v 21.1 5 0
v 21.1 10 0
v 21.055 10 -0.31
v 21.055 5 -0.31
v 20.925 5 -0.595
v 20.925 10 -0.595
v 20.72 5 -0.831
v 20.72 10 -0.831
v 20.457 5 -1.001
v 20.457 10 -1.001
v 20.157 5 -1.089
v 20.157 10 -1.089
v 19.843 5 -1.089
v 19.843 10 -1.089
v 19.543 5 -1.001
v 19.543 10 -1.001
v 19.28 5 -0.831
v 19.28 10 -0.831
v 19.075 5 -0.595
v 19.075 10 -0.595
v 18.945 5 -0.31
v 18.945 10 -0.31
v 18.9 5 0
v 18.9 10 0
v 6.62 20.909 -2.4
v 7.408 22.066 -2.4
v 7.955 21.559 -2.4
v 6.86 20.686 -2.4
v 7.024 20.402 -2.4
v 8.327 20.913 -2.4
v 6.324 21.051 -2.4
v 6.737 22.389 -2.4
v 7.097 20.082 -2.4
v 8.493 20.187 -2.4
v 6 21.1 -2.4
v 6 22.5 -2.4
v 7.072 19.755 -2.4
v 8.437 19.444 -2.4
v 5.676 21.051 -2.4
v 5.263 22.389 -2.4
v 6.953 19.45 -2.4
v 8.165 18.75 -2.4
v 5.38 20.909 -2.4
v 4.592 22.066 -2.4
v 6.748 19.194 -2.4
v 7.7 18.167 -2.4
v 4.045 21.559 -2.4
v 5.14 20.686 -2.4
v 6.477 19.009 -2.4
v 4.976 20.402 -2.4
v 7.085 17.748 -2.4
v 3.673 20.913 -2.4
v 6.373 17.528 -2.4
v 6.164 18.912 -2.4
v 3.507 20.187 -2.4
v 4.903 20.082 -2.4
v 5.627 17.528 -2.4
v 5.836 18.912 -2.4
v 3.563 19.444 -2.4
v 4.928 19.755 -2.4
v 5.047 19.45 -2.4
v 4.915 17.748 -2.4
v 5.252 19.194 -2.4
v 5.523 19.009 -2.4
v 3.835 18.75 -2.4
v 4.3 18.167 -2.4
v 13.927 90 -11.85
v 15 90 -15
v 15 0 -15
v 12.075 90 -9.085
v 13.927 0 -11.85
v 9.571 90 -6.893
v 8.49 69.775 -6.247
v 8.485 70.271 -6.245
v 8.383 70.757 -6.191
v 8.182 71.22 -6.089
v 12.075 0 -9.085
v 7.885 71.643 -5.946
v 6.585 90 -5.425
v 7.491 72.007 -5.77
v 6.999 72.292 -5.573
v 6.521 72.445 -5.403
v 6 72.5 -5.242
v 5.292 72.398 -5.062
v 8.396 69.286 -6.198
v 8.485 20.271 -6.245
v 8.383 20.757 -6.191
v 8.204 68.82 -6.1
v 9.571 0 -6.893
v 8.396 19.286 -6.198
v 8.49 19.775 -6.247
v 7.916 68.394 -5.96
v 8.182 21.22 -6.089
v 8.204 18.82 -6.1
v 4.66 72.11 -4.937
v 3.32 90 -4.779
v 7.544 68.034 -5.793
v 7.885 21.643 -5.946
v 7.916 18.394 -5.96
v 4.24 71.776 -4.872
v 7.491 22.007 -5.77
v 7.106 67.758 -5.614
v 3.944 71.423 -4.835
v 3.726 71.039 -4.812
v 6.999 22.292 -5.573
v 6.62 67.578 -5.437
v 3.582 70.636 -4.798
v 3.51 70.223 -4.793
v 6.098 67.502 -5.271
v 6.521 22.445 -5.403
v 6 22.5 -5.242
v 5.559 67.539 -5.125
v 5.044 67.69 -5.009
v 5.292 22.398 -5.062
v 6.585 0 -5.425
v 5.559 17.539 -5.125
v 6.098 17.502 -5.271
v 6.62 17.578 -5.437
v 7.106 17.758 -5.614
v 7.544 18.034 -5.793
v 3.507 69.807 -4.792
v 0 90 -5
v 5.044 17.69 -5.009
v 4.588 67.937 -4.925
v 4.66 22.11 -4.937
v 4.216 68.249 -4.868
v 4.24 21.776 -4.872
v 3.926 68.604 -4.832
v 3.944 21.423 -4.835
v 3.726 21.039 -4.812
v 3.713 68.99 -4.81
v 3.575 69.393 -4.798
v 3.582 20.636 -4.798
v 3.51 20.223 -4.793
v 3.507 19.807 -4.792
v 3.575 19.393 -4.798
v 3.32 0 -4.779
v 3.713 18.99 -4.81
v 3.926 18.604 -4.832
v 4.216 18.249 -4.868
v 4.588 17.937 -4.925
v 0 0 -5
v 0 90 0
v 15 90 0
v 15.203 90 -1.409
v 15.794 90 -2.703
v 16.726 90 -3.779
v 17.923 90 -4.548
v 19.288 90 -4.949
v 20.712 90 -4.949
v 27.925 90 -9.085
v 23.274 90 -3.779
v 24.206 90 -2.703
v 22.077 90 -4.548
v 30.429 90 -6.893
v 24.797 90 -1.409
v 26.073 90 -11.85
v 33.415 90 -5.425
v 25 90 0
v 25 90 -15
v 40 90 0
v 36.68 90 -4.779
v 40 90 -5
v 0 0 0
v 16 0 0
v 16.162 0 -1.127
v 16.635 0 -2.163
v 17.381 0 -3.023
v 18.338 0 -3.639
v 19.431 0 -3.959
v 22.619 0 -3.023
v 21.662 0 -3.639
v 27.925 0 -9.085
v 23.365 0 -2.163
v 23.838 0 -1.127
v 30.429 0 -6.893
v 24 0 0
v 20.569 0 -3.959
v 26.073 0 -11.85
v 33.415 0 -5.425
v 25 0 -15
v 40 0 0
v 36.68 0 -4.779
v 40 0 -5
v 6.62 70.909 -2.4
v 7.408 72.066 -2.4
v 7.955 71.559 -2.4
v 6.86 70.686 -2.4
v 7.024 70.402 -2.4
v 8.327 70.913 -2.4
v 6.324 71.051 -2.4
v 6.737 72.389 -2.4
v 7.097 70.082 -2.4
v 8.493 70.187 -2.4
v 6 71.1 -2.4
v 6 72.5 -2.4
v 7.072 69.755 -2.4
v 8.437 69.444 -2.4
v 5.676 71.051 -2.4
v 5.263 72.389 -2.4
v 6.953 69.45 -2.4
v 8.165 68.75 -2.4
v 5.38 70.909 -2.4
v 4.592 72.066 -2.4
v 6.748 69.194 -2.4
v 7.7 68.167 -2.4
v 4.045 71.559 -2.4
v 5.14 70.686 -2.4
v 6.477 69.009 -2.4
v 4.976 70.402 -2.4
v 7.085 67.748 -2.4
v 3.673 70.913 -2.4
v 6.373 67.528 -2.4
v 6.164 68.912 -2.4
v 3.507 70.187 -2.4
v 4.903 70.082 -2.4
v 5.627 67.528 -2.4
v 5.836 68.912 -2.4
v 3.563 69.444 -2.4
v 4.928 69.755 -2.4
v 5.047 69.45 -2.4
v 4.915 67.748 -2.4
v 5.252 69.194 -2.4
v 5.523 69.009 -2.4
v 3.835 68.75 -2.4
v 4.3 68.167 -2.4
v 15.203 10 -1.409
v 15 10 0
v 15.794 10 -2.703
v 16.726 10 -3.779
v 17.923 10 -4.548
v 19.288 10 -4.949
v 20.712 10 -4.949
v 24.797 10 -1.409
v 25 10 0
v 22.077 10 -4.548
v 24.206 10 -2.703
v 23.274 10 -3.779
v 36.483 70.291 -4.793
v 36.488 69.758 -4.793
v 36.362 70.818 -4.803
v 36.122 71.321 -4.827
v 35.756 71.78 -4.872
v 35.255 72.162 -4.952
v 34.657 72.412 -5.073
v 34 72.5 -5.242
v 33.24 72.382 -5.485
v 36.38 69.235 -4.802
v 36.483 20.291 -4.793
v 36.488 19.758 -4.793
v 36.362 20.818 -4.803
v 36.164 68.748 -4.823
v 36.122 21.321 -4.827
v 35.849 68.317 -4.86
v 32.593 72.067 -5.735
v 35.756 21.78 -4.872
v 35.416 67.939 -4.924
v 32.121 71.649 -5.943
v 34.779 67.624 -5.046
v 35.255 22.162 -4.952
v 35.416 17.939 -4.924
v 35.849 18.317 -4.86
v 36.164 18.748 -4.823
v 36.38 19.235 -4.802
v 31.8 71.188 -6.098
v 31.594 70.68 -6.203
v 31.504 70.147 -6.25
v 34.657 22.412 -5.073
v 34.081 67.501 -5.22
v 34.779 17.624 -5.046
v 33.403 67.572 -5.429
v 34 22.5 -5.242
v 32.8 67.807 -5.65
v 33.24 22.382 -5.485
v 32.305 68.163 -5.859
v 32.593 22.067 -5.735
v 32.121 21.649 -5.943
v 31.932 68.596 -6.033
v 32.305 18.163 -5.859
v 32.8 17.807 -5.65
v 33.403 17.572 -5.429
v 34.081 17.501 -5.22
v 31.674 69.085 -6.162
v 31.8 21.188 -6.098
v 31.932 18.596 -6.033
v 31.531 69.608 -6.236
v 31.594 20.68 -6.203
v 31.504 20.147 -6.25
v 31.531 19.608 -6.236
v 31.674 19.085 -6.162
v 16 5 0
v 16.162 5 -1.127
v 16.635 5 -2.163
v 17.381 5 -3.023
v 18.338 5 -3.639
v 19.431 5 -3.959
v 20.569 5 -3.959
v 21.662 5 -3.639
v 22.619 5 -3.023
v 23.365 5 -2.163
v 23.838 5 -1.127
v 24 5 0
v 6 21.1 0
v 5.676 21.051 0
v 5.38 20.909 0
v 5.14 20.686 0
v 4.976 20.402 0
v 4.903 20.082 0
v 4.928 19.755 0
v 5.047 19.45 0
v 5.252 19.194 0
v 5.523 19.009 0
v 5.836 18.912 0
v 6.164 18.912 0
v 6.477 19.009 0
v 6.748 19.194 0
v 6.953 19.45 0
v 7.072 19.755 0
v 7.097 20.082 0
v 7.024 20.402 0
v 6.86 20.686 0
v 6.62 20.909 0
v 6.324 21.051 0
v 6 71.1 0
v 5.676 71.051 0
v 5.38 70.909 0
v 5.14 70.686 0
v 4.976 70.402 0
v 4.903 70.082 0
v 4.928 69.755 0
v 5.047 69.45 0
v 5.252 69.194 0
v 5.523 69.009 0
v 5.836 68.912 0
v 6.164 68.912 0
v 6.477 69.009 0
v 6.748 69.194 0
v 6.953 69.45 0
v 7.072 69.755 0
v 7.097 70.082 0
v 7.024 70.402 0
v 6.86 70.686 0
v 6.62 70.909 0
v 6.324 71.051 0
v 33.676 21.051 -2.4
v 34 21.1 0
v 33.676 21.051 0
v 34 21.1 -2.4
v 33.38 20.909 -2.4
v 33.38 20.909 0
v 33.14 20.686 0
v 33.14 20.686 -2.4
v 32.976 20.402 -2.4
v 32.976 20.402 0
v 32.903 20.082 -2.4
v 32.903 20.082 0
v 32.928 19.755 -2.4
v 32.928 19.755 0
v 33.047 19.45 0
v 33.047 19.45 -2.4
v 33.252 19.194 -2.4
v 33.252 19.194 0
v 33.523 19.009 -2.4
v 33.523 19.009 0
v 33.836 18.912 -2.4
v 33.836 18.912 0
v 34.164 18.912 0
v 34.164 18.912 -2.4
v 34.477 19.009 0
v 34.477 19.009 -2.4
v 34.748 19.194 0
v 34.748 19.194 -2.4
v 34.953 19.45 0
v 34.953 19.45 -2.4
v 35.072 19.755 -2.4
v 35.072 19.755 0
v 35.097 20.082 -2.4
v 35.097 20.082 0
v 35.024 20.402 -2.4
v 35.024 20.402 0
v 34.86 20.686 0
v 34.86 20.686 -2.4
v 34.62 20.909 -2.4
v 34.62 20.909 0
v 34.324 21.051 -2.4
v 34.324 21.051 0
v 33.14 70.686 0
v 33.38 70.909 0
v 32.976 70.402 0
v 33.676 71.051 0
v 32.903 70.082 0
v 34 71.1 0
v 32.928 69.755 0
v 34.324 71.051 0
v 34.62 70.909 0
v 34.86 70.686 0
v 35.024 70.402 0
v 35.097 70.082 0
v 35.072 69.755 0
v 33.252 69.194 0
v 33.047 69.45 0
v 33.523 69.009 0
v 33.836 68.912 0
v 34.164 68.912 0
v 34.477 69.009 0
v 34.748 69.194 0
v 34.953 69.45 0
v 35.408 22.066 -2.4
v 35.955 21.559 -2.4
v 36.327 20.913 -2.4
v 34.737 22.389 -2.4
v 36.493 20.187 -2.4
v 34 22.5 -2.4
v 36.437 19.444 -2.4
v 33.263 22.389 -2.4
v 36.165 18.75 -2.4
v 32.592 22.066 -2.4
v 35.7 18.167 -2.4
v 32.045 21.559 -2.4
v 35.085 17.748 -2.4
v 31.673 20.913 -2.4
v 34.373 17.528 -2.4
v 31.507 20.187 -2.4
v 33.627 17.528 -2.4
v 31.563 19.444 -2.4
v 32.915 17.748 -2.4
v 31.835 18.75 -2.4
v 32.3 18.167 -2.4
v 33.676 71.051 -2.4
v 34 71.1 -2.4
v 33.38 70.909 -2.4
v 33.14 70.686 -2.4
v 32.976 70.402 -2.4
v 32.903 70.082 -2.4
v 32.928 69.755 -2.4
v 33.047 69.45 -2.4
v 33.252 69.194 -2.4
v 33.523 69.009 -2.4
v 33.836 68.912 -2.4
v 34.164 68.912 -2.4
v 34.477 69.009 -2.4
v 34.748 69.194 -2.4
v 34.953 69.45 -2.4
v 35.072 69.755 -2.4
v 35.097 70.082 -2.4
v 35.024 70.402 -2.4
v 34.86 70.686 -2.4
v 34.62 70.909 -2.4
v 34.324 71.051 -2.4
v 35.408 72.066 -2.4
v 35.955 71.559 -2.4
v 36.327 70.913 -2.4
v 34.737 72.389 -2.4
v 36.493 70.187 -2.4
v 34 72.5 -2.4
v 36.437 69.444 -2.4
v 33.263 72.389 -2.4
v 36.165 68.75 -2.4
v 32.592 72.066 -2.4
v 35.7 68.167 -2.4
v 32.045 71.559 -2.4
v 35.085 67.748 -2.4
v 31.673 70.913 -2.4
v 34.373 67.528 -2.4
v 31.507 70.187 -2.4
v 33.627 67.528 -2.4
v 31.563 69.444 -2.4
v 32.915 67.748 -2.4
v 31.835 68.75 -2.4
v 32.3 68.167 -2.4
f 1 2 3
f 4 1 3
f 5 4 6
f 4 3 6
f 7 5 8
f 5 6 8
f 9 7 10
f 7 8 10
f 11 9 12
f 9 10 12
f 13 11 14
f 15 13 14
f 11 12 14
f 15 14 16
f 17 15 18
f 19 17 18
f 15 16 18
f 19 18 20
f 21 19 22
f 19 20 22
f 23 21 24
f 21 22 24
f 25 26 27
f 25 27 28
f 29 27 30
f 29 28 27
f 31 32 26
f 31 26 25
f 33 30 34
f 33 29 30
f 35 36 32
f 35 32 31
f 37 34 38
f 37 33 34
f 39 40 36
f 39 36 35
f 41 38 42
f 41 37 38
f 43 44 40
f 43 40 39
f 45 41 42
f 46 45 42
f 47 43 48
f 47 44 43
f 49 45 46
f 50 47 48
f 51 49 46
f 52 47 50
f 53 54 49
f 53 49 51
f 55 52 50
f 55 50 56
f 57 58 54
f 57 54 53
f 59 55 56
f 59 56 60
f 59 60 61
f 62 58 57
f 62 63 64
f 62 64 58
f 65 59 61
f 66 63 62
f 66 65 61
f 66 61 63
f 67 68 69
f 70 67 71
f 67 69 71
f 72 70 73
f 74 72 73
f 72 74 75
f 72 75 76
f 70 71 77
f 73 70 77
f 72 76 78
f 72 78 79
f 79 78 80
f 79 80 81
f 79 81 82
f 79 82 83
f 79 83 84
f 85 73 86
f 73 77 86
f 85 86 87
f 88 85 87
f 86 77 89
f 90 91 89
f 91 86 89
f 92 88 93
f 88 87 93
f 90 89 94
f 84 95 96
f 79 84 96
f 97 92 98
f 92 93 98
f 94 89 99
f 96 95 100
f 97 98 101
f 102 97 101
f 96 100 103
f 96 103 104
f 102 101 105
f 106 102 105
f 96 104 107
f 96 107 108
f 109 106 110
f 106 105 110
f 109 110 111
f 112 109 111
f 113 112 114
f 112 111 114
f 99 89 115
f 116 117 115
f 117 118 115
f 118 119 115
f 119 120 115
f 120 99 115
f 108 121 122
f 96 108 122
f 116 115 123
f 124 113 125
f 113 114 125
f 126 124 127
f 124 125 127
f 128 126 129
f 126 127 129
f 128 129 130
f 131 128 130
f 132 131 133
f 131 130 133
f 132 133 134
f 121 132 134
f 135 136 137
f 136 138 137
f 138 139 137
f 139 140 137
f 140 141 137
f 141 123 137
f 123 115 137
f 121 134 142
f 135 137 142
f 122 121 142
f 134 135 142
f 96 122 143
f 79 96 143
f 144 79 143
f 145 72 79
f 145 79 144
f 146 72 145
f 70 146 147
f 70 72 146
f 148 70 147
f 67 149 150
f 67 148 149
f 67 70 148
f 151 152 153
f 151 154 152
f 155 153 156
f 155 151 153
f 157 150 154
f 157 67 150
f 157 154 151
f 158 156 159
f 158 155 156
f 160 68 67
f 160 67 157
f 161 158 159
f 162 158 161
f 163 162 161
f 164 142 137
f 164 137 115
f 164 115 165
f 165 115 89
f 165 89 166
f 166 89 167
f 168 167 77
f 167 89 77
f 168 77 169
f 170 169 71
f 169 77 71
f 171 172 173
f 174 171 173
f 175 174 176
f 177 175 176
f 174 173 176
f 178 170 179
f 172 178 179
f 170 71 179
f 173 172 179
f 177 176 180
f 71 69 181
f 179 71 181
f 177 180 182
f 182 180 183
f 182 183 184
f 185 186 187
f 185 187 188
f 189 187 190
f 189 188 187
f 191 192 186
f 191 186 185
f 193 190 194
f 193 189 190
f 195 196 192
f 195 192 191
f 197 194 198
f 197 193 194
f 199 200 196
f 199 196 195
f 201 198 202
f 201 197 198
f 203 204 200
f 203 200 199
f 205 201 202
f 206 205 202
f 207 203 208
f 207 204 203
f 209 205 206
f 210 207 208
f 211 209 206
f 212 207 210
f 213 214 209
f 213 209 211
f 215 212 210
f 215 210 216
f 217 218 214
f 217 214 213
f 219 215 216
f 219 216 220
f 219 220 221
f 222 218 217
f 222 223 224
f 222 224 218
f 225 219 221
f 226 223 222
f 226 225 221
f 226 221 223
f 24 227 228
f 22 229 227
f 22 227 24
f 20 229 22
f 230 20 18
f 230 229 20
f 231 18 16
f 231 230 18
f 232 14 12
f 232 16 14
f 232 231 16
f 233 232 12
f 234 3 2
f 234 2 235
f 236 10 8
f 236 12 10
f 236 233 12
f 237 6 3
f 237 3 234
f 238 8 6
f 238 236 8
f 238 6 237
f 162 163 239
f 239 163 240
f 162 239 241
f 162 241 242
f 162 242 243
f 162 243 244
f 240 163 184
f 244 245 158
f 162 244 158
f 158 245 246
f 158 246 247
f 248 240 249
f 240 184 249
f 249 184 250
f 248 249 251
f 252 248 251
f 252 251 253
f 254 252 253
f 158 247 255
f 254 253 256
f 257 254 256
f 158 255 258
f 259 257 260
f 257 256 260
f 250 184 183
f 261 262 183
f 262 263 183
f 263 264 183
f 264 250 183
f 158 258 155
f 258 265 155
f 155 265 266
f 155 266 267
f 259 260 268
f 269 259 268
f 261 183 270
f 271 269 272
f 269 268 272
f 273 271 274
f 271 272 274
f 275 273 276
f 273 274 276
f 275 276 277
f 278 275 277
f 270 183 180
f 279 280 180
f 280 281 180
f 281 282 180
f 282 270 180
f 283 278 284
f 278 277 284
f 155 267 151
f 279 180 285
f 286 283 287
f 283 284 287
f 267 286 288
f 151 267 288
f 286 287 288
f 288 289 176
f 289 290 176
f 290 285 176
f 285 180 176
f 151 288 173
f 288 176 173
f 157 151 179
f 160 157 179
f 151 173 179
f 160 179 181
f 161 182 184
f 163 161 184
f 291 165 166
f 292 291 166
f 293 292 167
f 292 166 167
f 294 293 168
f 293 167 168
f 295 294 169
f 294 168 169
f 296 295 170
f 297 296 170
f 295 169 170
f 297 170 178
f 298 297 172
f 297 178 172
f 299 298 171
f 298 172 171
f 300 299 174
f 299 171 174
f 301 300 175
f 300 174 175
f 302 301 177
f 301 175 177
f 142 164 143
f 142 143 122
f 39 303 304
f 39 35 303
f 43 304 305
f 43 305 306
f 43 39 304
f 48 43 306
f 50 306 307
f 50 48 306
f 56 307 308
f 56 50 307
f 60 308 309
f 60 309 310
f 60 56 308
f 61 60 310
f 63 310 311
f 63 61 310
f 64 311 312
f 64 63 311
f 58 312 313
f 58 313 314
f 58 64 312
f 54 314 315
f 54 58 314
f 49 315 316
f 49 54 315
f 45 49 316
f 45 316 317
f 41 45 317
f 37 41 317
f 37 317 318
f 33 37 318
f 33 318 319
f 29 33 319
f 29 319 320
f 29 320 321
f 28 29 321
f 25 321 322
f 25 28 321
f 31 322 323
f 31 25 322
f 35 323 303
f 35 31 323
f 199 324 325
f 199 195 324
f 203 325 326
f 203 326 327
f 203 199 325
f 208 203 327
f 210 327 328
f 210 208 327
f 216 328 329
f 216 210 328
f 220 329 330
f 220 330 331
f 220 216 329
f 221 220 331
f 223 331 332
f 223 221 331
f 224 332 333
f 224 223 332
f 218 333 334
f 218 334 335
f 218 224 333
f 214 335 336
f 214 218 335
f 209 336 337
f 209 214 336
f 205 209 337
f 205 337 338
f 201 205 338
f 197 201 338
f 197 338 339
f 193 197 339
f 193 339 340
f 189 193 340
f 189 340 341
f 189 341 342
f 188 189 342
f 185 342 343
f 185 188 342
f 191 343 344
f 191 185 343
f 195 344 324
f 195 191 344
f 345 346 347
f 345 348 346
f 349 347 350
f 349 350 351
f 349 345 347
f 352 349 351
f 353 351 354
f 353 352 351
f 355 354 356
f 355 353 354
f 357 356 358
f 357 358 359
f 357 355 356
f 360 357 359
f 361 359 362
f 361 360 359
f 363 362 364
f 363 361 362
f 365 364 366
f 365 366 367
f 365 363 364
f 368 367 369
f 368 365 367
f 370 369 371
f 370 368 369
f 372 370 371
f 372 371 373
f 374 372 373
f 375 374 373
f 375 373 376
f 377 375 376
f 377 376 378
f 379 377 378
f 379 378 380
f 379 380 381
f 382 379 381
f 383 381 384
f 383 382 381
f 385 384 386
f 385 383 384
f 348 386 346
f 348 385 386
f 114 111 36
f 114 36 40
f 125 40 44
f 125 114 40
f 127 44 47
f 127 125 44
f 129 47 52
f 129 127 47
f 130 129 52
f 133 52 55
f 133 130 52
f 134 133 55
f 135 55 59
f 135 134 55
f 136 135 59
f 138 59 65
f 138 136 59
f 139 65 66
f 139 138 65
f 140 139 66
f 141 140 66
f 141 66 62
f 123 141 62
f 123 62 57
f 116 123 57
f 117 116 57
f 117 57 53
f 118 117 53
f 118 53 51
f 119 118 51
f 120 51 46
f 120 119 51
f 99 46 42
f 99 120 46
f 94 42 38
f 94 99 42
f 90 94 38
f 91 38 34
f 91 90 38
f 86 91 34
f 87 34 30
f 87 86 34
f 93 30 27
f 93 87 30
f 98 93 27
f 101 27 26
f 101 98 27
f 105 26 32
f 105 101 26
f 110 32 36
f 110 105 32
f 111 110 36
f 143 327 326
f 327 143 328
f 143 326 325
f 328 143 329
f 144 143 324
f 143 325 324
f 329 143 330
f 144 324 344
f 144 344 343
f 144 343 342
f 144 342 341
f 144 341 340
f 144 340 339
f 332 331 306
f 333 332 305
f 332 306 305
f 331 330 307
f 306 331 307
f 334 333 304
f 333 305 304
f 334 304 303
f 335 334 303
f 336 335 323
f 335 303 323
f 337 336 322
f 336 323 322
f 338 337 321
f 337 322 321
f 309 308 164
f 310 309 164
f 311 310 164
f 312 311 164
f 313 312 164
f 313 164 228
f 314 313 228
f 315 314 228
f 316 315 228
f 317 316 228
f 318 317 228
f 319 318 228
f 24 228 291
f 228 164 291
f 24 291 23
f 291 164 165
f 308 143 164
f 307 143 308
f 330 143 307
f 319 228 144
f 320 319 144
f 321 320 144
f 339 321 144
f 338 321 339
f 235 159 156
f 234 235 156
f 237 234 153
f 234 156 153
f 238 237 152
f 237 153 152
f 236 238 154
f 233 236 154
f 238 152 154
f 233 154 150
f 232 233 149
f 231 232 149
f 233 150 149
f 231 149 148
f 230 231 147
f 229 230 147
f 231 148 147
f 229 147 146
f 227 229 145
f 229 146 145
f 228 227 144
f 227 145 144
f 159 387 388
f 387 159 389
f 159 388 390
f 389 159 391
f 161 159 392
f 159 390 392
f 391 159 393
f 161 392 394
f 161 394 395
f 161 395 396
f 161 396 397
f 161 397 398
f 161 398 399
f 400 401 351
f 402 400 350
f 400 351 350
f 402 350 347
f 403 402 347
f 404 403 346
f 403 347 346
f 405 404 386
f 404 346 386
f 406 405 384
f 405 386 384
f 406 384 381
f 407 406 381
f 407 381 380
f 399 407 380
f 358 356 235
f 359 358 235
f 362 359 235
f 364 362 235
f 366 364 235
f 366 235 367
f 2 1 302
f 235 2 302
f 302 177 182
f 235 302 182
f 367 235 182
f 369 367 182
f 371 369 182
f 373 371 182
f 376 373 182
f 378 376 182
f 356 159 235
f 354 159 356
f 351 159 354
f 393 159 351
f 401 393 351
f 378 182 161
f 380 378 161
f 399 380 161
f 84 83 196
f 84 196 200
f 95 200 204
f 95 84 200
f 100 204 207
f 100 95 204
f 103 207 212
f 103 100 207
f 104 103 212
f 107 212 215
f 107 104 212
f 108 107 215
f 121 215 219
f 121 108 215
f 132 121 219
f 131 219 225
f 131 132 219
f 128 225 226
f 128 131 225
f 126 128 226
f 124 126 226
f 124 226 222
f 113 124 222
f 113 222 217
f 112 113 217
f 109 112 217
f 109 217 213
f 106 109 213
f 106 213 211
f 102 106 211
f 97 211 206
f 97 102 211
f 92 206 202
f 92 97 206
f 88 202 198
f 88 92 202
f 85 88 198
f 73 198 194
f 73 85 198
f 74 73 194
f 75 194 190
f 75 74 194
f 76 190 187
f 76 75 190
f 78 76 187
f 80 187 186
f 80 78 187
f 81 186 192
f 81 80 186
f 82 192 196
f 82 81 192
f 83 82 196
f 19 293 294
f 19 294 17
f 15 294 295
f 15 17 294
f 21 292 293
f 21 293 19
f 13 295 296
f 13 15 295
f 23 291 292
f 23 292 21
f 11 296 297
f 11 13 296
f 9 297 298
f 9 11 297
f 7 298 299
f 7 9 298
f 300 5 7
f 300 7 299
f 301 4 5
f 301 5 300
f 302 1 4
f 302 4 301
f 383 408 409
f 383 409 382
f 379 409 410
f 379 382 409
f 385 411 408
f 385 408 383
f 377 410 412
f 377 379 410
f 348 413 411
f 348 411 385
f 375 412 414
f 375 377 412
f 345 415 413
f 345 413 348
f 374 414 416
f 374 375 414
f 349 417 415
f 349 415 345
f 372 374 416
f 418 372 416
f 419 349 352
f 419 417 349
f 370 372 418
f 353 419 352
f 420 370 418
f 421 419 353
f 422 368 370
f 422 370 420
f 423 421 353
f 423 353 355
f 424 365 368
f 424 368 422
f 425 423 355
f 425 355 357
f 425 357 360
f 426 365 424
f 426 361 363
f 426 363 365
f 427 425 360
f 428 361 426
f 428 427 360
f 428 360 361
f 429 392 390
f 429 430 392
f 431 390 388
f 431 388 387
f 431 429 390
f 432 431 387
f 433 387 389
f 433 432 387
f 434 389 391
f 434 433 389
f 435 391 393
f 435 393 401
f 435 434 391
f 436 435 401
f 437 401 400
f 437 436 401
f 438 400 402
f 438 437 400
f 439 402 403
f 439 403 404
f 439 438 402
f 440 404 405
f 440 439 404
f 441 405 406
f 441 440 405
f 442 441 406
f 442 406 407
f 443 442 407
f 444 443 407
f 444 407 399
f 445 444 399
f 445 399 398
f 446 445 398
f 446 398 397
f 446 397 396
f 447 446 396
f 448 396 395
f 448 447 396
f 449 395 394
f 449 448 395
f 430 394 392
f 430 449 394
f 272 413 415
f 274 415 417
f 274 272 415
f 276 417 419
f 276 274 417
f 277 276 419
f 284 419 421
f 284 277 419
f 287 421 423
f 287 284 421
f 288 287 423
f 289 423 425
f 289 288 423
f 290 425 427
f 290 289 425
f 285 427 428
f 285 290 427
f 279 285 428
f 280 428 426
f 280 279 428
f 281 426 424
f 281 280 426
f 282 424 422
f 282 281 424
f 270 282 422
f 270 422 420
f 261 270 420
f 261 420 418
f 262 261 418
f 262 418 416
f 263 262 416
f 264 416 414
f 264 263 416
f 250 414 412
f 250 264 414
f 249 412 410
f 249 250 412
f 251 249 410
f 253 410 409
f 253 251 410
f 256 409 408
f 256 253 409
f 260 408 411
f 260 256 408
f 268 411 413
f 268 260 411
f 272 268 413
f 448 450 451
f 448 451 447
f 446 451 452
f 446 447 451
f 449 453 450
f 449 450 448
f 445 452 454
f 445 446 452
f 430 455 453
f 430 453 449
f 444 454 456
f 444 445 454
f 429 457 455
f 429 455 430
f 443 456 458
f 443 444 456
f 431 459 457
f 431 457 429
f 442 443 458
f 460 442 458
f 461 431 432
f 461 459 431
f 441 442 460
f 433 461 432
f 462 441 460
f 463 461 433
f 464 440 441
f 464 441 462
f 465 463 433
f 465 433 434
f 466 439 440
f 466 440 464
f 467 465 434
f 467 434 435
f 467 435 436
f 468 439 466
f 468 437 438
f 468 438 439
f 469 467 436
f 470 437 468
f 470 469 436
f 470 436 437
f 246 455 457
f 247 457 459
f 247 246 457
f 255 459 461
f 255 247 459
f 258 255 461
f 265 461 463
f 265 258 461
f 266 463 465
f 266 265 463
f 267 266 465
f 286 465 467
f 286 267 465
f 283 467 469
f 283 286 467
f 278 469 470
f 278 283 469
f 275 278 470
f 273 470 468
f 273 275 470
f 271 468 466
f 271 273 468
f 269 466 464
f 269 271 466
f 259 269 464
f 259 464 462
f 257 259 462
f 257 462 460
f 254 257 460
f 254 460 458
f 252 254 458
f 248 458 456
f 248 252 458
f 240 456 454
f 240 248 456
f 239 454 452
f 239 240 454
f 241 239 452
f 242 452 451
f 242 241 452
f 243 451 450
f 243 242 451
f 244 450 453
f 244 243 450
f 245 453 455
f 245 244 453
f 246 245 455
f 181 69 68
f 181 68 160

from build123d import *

# Parameters (mm, degrees)
SKIZZE2_W                                    = 40
SKIZZE2_H                                    = 15
AUFSATZ_LINEAR_AUSTRAGEN1_DEPTH              = 90
SKIZZE3_R                                    = 5
SCHNITT_LINEAR_AUSTRAGEN1_DEPTH              = 80
SKIZZE4_R                                    = 4
SCHNITT_LINEAR_AUSTRAGEN2_DEPTH              = 5
SKIZZE5_R                                    = 1.1
SCHNITT_LINEAR_AUSTRAGEN3_DEPTH              = 91.691785736
STIRNSENKUNG_F_R_M2_FLACHKOPFSCHRAUB_2_COUNT = 2
STIRNSENKUNG_F_R_M2_FLACHKOPFSCHRAUB_2_PITCH = 50
STIRNSENKUNG_F_R_M2_FLACHKOPFSCHRAUB_3_COUNT = 2
STIRNSENKUNG_F_R_M2_FLACHKOPFSCHRAUB_3_PITCH = 57.306195128
STIRNSENKUNG_F_R_M2_FLACHKOPFSCHRAUB_4_COUNT = 2
STIRNSENKUNG_F_R_M2_FLACHKOPFSCHRAUB_4_PITCH = 28
SCHNITT_LINEAR_AUSTRAGEN6_DEPTH              = 100.624294226
SCHNITT_LINEAR_AUSTRAGEN6_DEPTH_BACK         = 100.624294226
SCHNITT_LINEAR_AUSTRAGEN7_DEPTH              = 100.624294371
SCHNITT_LINEAR_AUSTRAGEN7_DEPTH_BACK         = 100.624294371


with BuildPart() as part:
    # Skizze2 → Aufsatz-Linear austragen1 (new body)
    with BuildSketch(Plane(origin=(0, 0, 0), x_dir=(1, 0, 0), z_dir=(0, 1, 0))):
        with Locations((20, 7.5)):
            Rectangle(SKIZZE2_W, SKIZZE2_H)
    extrude(amount=AUFSATZ_LINEAR_AUSTRAGEN1_DEPTH)

    # Skizze3 → Schnitt-Linear austragen1 (cut)
    with BuildSketch(Plane(origin=(0, 90, 0), x_dir=(1, 0, 0), z_dir=(0, 1, 0))):
        with Locations((20, 0)):
            Circle(SKIZZE3_R)
    extrude(amount=-SCHNITT_LINEAR_AUSTRAGEN1_DEPTH, mode=Mode.SUBTRACT)

    # Skizze4 → Schnitt-Linear austragen2 (cut)
    with BuildSketch(Plane.XZ):
        with Locations((20, 0)):
            Circle(SKIZZE4_R)
    extrude(amount=-SCHNITT_LINEAR_AUSTRAGEN2_DEPTH, mode=Mode.SUBTRACT)

    # Skizze5 → Schnitt-Linear austragen3 (cut, through all)
    with BuildSketch(Plane(origin=(0, 10, 0), x_dir=(1, 0, 0), z_dir=(0, 1, 0))):
        with Locations((20, 0)):
            Circle(SKIZZE5_R)
    extrude(amount=-SCHNITT_LINEAR_AUSTRAGEN3_DEPTH, mode=Mode.SUBTRACT)

    # Skizze8 → Stirnsenkung für M2 Flachkopfschraube mit Schlitz1 (revolve, cut)
    with BuildSketch(Plane(origin=(6, 70, -15), x_dir=(0, 1, 0), z_dir=(1, 0, 0))):
        Polygon((0, 0), (0, 15), (1.1, 15), (1.1, 12.6), (2.5, 12.6), (2.5, 1), (3.5, 0), align=None)
    stirnsenkung_f_r_m2_flachkopfschraube_mi = revolve(axis=Axis((6, 70, -21.35), (0, 0, 1)), mode=Mode.SUBTRACT)

    # Stirnsenkung f_r M2 Flachkopfschraub 2: Stirnsenkung für M2 Flachkopfschraube mit Schlitz1 ×2
    with Locations(*[(0, -i * STIRNSENKUNG_F_R_M2_FLACHKOPFSCHRAUB_2_PITCH, 0) for i in range(1, STIRNSENKUNG_F_R_M2_FLACHKOPFSCHRAUB_2_COUNT)]):
        add(stirnsenkung_f_r_m2_flachkopfschraube_mi, mode=Mode.SUBTRACT)

    # Stirnsenkung f_r M2 Flachkopfschraub 3: Stirnsenkung für M2 Flachkopfschraube mit Schlitz1 ×2
    with Locations(*[Vector(0.48860336893184336, -0.87250601594972, 0) * (i * STIRNSENKUNG_F_R_M2_FLACHKOPFSCHRAUB_3_PITCH) for i in range(1, STIRNSENKUNG_F_R_M2_FLACHKOPFSCHRAUB_3_COUNT)]):
        add(stirnsenkung_f_r_m2_flachkopfschraube_mi, mode=Mode.SUBTRACT)

    # Stirnsenkung f_r M2 Flachkopfschraub 4: Stirnsenkung für M2 Flachkopfschraube mit Schlitz1 ×2
    with Locations(*[(i * STIRNSENKUNG_F_R_M2_FLACHKOPFSCHRAUB_4_PITCH, 0, 0) for i in range(1, STIRNSENKUNG_F_R_M2_FLACHKOPFSCHRAUB_4_COUNT)]):
        add(stirnsenkung_f_r_m2_flachkopfschraube_mi, mode=Mode.SUBTRACT)

    # Skizze11 → Schnitt-Linear austragen6 (cut, two sides: drawn at the far end of the back side and taken through both)
    with BuildSketch(Plane(origin=(0, 90, 0), x_dir=(1, 0, 0), z_dir=(0, 1, 0)).offset(-SCHNITT_LINEAR_AUSTRAGEN6_DEPTH_BACK)):
        with BuildLine():
            Line((130.666560763, 23.133312153), (40, 5))
            ThreePointArc((40, 5), (30.428932188, 6.893398282), (25, 15))
            Line((25, 15), (6.866687847, 105.666560763))
            Line((6.866687847, 105.666560763), (109.444191755, 259.532816625))
            Line((109.444191755, 259.532816625), (233.244064671, 176.999568015))
            Line((233.244064671, 176.999568015), (130.666560763, 23.133312153))
        make_face()
    extrude(amount=SCHNITT_LINEAR_AUSTRAGEN6_DEPTH + SCHNITT_LINEAR_AUSTRAGEN6_DEPTH_BACK, mode=Mode.SUBTRACT)

    # Skizze14 → Schnitt-Linear austragen7 (cut, two sides: drawn at the far end of the back side and taken through both)
    with BuildSketch(Plane(origin=(0, 90, 0), x_dir=(1, 0, 0), z_dir=(0, 1, 0)).offset(-SCHNITT_LINEAR_AUSTRAGEN7_DEPTH_BACK)):
        with BuildLine():
            Line((33.1333122, 105.666561001), (15, 15))
            ThreePointArc((15, 15), (9.571067812, 6.893398282), (0, 5))
            Line((0, 5), (-90.666561001, 23.1333122))
            Line((-90.666561001, 23.1333122), (-193.244065178, 176.999568466))
            Line((-193.244065178, 176.999568466), (-69.444191977, 259.532817267))
            Line((-69.444191977, 259.532817267), (33.1333122, 105.666561001))
        make_face()
    extrude(amount=SCHNITT_LINEAR_AUSTRAGEN7_DEPTH + SCHNITT_LINEAR_AUSTRAGEN7_DEPTH_BACK, mode=Mode.SUBTRACT)


solid = part.part
